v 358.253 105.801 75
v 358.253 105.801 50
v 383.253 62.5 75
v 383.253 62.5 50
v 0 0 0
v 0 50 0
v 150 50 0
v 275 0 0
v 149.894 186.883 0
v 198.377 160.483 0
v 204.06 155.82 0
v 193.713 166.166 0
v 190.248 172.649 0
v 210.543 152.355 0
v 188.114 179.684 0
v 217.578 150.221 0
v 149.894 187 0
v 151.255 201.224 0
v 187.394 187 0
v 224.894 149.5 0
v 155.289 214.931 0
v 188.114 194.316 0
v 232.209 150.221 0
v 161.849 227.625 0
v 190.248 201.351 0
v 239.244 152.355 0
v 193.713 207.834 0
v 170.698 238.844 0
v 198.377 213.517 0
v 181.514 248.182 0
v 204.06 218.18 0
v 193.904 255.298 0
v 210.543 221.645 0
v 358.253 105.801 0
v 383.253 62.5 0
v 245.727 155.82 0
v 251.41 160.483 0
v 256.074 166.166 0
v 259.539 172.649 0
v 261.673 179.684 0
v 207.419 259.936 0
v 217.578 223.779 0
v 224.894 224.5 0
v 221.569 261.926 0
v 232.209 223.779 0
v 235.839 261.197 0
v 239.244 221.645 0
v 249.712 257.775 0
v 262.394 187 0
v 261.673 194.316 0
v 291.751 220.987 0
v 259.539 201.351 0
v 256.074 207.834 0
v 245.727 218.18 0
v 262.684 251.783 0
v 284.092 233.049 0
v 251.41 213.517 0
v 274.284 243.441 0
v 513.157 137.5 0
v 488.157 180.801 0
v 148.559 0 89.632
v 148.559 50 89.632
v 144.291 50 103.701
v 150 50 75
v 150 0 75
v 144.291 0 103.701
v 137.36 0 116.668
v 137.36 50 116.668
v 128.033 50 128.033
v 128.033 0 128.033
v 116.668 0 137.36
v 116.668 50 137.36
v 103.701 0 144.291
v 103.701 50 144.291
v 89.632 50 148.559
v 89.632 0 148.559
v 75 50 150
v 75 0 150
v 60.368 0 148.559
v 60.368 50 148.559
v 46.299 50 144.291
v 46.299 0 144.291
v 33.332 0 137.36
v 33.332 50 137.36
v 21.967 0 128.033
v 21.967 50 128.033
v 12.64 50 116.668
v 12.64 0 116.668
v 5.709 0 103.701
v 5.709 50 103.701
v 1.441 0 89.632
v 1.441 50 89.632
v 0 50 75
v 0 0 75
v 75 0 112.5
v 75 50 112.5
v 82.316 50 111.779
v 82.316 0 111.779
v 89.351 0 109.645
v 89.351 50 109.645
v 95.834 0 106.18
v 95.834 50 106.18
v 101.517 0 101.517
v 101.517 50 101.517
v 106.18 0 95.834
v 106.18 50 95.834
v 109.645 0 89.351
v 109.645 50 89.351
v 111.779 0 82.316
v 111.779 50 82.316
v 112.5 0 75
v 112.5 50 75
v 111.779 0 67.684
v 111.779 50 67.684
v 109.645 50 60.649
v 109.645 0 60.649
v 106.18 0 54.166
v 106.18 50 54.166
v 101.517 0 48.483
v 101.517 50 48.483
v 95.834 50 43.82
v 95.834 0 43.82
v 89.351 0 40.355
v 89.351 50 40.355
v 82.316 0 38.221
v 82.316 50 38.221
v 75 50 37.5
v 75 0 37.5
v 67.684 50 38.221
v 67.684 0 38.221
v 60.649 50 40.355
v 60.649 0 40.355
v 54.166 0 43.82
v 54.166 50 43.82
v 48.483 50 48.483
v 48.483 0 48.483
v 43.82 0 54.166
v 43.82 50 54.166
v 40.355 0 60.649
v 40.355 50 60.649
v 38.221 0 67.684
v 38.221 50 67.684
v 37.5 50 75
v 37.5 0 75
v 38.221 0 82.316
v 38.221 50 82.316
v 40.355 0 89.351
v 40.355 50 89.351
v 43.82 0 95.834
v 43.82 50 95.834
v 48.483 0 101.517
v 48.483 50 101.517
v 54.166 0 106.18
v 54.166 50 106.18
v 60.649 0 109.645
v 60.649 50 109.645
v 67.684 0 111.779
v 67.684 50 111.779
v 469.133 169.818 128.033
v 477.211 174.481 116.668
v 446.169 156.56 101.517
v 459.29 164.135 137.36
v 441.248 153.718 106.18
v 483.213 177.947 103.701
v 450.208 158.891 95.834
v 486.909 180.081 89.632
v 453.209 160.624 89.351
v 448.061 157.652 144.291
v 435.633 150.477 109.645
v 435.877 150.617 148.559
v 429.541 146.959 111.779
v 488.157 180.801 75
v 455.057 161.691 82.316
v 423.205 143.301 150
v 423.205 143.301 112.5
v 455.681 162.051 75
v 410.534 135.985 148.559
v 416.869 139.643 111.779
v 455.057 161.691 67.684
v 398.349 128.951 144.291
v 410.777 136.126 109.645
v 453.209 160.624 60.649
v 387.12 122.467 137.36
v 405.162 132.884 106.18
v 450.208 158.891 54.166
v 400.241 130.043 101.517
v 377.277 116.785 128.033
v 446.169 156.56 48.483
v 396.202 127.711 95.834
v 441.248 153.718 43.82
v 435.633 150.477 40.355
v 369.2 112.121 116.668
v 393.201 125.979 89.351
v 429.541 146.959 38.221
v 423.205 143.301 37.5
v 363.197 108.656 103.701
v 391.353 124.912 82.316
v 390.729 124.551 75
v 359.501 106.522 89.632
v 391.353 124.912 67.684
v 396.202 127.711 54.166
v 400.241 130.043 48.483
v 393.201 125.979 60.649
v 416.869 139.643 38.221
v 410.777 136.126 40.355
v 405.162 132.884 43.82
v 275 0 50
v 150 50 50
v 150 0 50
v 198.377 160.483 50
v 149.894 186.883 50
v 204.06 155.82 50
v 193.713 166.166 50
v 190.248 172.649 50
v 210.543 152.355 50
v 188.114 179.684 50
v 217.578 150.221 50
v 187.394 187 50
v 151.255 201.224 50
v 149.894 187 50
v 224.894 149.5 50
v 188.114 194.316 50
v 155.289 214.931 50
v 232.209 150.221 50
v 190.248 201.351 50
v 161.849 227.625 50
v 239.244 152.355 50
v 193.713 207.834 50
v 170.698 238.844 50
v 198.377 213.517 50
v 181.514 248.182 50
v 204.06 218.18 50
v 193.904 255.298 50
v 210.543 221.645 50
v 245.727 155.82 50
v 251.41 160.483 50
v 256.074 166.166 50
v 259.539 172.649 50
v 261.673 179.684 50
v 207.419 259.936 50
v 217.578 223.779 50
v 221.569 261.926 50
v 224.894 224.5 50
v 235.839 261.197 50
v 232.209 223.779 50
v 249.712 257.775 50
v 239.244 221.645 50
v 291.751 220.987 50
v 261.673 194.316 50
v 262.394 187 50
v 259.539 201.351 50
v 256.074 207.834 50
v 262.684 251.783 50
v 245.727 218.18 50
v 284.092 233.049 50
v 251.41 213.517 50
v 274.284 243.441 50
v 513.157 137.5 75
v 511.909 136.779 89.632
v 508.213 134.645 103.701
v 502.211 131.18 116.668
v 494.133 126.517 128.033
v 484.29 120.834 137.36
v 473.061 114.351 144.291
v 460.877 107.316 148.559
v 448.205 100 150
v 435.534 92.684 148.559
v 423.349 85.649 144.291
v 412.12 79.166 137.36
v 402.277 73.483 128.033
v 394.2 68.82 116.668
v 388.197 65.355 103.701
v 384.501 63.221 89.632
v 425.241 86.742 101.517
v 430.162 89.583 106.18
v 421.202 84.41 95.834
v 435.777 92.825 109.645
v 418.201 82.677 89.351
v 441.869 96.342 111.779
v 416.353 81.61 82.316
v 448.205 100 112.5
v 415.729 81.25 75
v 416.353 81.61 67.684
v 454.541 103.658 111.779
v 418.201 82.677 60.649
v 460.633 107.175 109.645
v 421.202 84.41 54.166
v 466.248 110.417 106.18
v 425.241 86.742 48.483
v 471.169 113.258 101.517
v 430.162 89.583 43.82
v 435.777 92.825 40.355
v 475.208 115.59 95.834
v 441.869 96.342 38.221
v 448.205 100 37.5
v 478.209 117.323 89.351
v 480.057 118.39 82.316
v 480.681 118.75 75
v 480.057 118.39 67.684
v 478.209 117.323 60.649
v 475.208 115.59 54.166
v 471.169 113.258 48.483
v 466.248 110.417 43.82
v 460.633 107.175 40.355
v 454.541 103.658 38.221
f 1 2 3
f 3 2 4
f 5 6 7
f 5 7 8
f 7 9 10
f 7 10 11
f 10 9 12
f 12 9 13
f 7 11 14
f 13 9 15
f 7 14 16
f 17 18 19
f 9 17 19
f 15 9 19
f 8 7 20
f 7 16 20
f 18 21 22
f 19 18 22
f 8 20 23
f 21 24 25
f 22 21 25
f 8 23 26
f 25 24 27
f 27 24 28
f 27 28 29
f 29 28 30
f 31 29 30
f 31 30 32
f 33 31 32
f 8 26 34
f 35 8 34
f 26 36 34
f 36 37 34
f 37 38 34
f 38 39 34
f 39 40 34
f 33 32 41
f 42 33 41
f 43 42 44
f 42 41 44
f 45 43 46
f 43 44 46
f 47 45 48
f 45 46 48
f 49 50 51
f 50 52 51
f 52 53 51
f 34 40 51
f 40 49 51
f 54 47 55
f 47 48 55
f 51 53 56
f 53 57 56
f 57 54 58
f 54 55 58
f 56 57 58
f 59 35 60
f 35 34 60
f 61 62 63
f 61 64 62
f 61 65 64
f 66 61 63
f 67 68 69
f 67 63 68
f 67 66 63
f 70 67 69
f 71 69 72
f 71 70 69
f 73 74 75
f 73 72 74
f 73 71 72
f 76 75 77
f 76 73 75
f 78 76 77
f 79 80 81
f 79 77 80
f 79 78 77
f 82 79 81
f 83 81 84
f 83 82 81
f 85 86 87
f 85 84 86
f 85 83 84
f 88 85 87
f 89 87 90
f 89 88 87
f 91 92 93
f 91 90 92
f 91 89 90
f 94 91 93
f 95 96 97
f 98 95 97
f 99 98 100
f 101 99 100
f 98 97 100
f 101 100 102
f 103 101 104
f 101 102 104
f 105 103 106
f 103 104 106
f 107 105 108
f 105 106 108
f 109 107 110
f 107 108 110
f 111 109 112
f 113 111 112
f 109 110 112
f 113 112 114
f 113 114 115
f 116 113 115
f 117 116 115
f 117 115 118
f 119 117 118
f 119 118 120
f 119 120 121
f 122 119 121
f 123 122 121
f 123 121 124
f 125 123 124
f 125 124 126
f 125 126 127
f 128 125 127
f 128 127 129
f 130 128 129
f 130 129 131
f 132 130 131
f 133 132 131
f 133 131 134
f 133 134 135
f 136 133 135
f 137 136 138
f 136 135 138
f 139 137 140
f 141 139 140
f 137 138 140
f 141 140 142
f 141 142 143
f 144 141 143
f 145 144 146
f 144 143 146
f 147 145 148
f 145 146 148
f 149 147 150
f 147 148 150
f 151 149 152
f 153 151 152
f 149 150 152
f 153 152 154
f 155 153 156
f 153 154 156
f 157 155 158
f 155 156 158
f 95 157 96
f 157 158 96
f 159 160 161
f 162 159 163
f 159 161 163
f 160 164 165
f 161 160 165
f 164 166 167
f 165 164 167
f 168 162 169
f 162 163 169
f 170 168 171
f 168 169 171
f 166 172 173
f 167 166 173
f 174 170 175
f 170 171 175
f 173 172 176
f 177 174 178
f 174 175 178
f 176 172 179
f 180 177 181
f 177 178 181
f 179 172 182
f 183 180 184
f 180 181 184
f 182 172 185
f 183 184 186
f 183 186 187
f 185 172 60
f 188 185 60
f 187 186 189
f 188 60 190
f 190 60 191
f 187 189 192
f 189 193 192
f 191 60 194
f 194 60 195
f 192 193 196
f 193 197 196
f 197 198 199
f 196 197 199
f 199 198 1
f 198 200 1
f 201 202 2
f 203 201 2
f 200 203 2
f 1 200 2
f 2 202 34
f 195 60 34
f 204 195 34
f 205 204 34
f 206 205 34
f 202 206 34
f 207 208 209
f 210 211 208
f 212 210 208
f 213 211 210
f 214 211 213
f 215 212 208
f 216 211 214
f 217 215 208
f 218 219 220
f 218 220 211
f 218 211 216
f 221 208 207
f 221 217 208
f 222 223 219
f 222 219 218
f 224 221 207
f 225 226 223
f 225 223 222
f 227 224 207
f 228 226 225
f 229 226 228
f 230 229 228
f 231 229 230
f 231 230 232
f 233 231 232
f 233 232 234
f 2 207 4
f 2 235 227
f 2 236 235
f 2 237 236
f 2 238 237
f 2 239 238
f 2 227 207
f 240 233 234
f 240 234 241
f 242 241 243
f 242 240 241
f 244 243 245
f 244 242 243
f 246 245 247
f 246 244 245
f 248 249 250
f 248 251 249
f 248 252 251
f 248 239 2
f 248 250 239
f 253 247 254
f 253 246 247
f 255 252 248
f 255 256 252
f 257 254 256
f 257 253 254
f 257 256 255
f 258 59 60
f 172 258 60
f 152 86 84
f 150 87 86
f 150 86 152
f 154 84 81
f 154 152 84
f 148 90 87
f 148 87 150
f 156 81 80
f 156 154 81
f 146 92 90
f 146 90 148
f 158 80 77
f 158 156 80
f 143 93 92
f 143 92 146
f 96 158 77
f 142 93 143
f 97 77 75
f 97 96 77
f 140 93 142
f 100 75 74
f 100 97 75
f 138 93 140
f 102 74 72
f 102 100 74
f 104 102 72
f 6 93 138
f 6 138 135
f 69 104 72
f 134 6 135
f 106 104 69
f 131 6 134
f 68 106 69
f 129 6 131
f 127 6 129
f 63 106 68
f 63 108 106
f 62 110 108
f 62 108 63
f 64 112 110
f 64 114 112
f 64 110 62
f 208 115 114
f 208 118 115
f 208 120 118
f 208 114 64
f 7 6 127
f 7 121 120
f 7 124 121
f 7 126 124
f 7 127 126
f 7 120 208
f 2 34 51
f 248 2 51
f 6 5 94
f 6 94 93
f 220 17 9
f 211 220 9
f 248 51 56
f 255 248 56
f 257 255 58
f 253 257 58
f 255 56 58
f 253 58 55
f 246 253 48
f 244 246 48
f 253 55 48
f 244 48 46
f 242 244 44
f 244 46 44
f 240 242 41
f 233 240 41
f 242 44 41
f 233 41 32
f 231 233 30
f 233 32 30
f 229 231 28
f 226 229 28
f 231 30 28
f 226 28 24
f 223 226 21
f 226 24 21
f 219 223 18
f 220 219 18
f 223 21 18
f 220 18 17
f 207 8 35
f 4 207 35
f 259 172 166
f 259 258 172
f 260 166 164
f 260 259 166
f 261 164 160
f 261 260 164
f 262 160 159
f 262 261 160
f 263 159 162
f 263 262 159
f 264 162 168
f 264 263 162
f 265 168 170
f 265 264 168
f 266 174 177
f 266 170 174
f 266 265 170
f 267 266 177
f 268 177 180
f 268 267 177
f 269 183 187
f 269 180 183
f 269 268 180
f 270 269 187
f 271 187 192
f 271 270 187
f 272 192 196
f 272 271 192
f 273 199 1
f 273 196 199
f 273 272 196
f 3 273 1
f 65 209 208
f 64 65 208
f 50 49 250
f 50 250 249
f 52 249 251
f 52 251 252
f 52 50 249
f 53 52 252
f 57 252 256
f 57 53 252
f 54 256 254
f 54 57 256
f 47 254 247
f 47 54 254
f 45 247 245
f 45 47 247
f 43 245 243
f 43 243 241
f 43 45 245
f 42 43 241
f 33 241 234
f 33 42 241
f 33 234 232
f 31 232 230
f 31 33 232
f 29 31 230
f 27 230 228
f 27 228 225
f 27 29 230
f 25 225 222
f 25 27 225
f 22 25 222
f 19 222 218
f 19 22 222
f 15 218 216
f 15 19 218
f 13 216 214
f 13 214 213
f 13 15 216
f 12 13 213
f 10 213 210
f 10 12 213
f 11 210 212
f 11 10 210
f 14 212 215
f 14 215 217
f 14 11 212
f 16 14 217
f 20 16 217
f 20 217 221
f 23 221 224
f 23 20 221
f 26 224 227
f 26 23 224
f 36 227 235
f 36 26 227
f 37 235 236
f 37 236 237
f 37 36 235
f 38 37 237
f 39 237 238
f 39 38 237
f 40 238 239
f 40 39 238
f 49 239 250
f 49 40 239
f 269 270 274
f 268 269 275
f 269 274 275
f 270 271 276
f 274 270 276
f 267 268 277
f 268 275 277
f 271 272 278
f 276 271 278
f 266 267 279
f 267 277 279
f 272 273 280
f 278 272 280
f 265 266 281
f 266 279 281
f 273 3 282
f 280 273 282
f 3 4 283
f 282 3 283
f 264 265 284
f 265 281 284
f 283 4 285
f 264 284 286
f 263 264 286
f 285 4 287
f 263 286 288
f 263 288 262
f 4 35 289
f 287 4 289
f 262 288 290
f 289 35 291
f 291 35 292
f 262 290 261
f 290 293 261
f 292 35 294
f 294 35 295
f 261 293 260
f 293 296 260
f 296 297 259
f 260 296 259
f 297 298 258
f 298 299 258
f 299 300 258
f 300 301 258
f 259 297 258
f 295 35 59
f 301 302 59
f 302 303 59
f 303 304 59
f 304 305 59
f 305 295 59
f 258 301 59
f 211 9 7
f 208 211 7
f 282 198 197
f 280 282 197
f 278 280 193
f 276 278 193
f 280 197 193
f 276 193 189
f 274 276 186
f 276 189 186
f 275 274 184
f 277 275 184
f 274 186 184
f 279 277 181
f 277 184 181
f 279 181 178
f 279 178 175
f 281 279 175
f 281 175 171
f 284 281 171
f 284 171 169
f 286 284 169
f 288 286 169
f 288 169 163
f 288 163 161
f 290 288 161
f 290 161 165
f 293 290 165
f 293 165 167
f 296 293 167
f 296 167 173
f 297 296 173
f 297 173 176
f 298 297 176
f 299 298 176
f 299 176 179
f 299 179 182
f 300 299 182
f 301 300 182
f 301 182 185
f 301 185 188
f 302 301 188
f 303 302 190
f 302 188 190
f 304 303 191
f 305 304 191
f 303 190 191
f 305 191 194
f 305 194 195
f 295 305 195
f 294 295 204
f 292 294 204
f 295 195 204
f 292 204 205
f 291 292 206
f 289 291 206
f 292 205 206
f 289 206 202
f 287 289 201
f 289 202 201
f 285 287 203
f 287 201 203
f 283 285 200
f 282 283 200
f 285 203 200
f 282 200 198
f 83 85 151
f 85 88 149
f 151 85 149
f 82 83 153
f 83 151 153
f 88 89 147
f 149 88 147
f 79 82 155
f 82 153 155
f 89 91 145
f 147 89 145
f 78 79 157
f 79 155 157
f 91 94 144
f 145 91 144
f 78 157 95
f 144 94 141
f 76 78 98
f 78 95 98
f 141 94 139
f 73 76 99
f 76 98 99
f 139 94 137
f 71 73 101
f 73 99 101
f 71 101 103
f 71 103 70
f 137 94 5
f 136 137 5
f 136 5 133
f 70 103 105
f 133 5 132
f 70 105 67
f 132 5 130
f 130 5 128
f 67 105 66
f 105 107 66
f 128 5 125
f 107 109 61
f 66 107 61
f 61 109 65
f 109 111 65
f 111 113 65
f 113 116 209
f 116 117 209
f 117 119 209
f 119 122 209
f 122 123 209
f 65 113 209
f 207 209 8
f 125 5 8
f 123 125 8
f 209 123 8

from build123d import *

# Parameters (mm, degrees)
SKETCH1_W             = 150
SKETCH1_H             = 50
BOSS_EXTRUDE2_DEPTH   = 150
BOSS_EXTRUDE2_2_DEPTH = 150
SKETCH1_4_R           = 37.5
SKETCH1_4_W           = 150
SKETCH1_4_H           = 50
BOSS_EXTRUDE3_DEPTH   = 50
FILLET2_RADIUS        = 75
FILLET2_LENGTH        = 50
FILLET3_RADIUS        = 75
FILLET3_LENGTH        = 50
SKETCH2_R             = 37.5
CUT_EXTRUDE1_DEPTH    = 576.129630886
SKETCH3_R             = 37.5
CUT_EXTRUDE2_DEPTH    = 598.441520826


with BuildPart() as part:
    # Sketch1 → Boss-Extrude2 (new body)
    with BuildSketch(Plane.XY):
        with Locations((75, 25)):
            Rectangle(SKETCH1_W, SKETCH1_H)
    extrude(amount=BOSS_EXTRUDE2_DEPTH)



with BuildPart() as body_2:
    # Sketch1 → Boss-Extrude2 2 (new body)
    with BuildSketch(Plane.XY):
        Polygon((358.253175473, 105.801270189), (383.253175473, 62.5), (513.156986041, 137.5), (488.156986041, 180.801270189), align=None)
    extrude(amount=BOSS_EXTRUDE2_2_DEPTH)


with BuildPart() as part_1:
    add(part.part)

    add(body_2.part)  # Boss-Extrude3 merges body 2
    # Sketch1<4> → Boss-Extrude3 (add)
    # profile 1 of 3: a face of its own
    with BuildSketch(Plane.XY):
        with BuildLine():
            Line((150, 50), (150, 0))
            Line((150, 0), (275, 0))
            Line((275, 0), (383.253175473, 62.5))
            Line((383.253175473, 62.5), (358.253175473, 105.801270189))
            Line((358.253175473, 105.801270189), (291.750893275, 220.986601776))
            ThreePointArc((291.750893275, 220.986601776), (207.419297449, 259.935945937), (149.893501015, 187))
            Line((149.893501015, 187), (149.89359166, 186.883395343))
            Line((149.89359166, 186.883395343), (150, 50))
        make_face()
        with Locations((224.893501015, 187)):
            Circle(SKETCH1_4_R, mode=Mode.SUBTRACT)
    # profile 2 of 3: a face of its own
    with BuildSketch(Plane.XY):
        with Locations((75, 25)):
            Rectangle(SKETCH1_4_W, SKETCH1_4_H)
    # profile 3 of 3: a face of its own
    with BuildSketch(Plane.XY):
        Polygon((358.253175473, 105.801270189), (383.253175473, 62.5), (513.156986041, 137.5), (488.156986041, 180.801270189), align=None)
    extrude(amount=BOSS_EXTRUDE3_DEPTH)

    # Fillet2: full round fillet: the end face becomes a half cylinder, R = half its width
    fillet2_face = Plane((435.705080757, 121.650635095, 150), x_dir=(0.5, -0.866025403784, 0), z_dir=(0, 0, 1))  # on the end face: x along it, z out of the body
    fillet2_slab = fillet2_face.offset(-FILLET2_RADIUS / 2) * Box(FILLET2_LENGTH, 2 * FILLET2_RADIUS, FILLET2_RADIUS, mode=Mode.PRIVATE)  # the body's end, R deep
    fillet2_round = Plane((435.705080757, 121.650635095, 75), x_dir=(0, 0, 1), z_dir=(0.5, -0.866025403784, 0)) * Cylinder(FILLET2_RADIUS, FILLET2_LENGTH, mode=Mode.PRIVATE)  # its axis R under the face
    add(fillet2_slab - fillet2_round, mode=Mode.SUBTRACT)

    # Fillet3: full round fillet: the end face becomes a half cylinder, R = half its width
    fillet3_face = Plane((75, 25, 150), x_dir=(0, -1, 0), z_dir=(0, 0, 1))  # on the end face: x along it, z out of the body
    fillet3_slab = fillet3_face.offset(-FILLET3_RADIUS / 2) * Box(FILLET3_LENGTH, 2 * FILLET3_RADIUS, FILLET3_RADIUS, mode=Mode.PRIVATE)  # the body's end, R deep
    fillet3_round = Plane((75, 25, 75), x_dir=(0, 0, 1), z_dir=(0, -1, 0)) * Cylinder(FILLET3_RADIUS, FILLET3_LENGTH, mode=Mode.PRIVATE)  # its axis R under the face
    add(fillet3_slab - fillet3_round, mode=Mode.SUBTRACT)

    # Sketch2 → Cut-Extrude1 (cut, through all)
    with BuildSketch(Plane(origin=(0, 50, 0), x_dir=(1, 0, 0), z_dir=(0, 1, 0))):
        with Locations(Location((75, -75, 0), (0, 0, 270))):
            Circle(SKETCH2_R)
    extrude(amount=-CUT_EXTRUDE1_DEPTH, mode=Mode.SUBTRACT)

    # Sketch3 → Cut-Extrude2 (cut, through all)
    with BuildSketch(Plane(origin=(43.75, -75.777222831, 0), x_dir=(0.8660254037844382, 0.500000000000001, 0), z_dir=(-0.500000000000001, 0.8660254037844382, 0))):
        with Locations(Location((438.156986041, -75, 0), (0, 0, 180))):
            Circle(SKETCH3_R)
    extrude(amount=-CUT_EXTRUDE2_DEPTH, mode=Mode.SUBTRACT)


solid = part_1.part
